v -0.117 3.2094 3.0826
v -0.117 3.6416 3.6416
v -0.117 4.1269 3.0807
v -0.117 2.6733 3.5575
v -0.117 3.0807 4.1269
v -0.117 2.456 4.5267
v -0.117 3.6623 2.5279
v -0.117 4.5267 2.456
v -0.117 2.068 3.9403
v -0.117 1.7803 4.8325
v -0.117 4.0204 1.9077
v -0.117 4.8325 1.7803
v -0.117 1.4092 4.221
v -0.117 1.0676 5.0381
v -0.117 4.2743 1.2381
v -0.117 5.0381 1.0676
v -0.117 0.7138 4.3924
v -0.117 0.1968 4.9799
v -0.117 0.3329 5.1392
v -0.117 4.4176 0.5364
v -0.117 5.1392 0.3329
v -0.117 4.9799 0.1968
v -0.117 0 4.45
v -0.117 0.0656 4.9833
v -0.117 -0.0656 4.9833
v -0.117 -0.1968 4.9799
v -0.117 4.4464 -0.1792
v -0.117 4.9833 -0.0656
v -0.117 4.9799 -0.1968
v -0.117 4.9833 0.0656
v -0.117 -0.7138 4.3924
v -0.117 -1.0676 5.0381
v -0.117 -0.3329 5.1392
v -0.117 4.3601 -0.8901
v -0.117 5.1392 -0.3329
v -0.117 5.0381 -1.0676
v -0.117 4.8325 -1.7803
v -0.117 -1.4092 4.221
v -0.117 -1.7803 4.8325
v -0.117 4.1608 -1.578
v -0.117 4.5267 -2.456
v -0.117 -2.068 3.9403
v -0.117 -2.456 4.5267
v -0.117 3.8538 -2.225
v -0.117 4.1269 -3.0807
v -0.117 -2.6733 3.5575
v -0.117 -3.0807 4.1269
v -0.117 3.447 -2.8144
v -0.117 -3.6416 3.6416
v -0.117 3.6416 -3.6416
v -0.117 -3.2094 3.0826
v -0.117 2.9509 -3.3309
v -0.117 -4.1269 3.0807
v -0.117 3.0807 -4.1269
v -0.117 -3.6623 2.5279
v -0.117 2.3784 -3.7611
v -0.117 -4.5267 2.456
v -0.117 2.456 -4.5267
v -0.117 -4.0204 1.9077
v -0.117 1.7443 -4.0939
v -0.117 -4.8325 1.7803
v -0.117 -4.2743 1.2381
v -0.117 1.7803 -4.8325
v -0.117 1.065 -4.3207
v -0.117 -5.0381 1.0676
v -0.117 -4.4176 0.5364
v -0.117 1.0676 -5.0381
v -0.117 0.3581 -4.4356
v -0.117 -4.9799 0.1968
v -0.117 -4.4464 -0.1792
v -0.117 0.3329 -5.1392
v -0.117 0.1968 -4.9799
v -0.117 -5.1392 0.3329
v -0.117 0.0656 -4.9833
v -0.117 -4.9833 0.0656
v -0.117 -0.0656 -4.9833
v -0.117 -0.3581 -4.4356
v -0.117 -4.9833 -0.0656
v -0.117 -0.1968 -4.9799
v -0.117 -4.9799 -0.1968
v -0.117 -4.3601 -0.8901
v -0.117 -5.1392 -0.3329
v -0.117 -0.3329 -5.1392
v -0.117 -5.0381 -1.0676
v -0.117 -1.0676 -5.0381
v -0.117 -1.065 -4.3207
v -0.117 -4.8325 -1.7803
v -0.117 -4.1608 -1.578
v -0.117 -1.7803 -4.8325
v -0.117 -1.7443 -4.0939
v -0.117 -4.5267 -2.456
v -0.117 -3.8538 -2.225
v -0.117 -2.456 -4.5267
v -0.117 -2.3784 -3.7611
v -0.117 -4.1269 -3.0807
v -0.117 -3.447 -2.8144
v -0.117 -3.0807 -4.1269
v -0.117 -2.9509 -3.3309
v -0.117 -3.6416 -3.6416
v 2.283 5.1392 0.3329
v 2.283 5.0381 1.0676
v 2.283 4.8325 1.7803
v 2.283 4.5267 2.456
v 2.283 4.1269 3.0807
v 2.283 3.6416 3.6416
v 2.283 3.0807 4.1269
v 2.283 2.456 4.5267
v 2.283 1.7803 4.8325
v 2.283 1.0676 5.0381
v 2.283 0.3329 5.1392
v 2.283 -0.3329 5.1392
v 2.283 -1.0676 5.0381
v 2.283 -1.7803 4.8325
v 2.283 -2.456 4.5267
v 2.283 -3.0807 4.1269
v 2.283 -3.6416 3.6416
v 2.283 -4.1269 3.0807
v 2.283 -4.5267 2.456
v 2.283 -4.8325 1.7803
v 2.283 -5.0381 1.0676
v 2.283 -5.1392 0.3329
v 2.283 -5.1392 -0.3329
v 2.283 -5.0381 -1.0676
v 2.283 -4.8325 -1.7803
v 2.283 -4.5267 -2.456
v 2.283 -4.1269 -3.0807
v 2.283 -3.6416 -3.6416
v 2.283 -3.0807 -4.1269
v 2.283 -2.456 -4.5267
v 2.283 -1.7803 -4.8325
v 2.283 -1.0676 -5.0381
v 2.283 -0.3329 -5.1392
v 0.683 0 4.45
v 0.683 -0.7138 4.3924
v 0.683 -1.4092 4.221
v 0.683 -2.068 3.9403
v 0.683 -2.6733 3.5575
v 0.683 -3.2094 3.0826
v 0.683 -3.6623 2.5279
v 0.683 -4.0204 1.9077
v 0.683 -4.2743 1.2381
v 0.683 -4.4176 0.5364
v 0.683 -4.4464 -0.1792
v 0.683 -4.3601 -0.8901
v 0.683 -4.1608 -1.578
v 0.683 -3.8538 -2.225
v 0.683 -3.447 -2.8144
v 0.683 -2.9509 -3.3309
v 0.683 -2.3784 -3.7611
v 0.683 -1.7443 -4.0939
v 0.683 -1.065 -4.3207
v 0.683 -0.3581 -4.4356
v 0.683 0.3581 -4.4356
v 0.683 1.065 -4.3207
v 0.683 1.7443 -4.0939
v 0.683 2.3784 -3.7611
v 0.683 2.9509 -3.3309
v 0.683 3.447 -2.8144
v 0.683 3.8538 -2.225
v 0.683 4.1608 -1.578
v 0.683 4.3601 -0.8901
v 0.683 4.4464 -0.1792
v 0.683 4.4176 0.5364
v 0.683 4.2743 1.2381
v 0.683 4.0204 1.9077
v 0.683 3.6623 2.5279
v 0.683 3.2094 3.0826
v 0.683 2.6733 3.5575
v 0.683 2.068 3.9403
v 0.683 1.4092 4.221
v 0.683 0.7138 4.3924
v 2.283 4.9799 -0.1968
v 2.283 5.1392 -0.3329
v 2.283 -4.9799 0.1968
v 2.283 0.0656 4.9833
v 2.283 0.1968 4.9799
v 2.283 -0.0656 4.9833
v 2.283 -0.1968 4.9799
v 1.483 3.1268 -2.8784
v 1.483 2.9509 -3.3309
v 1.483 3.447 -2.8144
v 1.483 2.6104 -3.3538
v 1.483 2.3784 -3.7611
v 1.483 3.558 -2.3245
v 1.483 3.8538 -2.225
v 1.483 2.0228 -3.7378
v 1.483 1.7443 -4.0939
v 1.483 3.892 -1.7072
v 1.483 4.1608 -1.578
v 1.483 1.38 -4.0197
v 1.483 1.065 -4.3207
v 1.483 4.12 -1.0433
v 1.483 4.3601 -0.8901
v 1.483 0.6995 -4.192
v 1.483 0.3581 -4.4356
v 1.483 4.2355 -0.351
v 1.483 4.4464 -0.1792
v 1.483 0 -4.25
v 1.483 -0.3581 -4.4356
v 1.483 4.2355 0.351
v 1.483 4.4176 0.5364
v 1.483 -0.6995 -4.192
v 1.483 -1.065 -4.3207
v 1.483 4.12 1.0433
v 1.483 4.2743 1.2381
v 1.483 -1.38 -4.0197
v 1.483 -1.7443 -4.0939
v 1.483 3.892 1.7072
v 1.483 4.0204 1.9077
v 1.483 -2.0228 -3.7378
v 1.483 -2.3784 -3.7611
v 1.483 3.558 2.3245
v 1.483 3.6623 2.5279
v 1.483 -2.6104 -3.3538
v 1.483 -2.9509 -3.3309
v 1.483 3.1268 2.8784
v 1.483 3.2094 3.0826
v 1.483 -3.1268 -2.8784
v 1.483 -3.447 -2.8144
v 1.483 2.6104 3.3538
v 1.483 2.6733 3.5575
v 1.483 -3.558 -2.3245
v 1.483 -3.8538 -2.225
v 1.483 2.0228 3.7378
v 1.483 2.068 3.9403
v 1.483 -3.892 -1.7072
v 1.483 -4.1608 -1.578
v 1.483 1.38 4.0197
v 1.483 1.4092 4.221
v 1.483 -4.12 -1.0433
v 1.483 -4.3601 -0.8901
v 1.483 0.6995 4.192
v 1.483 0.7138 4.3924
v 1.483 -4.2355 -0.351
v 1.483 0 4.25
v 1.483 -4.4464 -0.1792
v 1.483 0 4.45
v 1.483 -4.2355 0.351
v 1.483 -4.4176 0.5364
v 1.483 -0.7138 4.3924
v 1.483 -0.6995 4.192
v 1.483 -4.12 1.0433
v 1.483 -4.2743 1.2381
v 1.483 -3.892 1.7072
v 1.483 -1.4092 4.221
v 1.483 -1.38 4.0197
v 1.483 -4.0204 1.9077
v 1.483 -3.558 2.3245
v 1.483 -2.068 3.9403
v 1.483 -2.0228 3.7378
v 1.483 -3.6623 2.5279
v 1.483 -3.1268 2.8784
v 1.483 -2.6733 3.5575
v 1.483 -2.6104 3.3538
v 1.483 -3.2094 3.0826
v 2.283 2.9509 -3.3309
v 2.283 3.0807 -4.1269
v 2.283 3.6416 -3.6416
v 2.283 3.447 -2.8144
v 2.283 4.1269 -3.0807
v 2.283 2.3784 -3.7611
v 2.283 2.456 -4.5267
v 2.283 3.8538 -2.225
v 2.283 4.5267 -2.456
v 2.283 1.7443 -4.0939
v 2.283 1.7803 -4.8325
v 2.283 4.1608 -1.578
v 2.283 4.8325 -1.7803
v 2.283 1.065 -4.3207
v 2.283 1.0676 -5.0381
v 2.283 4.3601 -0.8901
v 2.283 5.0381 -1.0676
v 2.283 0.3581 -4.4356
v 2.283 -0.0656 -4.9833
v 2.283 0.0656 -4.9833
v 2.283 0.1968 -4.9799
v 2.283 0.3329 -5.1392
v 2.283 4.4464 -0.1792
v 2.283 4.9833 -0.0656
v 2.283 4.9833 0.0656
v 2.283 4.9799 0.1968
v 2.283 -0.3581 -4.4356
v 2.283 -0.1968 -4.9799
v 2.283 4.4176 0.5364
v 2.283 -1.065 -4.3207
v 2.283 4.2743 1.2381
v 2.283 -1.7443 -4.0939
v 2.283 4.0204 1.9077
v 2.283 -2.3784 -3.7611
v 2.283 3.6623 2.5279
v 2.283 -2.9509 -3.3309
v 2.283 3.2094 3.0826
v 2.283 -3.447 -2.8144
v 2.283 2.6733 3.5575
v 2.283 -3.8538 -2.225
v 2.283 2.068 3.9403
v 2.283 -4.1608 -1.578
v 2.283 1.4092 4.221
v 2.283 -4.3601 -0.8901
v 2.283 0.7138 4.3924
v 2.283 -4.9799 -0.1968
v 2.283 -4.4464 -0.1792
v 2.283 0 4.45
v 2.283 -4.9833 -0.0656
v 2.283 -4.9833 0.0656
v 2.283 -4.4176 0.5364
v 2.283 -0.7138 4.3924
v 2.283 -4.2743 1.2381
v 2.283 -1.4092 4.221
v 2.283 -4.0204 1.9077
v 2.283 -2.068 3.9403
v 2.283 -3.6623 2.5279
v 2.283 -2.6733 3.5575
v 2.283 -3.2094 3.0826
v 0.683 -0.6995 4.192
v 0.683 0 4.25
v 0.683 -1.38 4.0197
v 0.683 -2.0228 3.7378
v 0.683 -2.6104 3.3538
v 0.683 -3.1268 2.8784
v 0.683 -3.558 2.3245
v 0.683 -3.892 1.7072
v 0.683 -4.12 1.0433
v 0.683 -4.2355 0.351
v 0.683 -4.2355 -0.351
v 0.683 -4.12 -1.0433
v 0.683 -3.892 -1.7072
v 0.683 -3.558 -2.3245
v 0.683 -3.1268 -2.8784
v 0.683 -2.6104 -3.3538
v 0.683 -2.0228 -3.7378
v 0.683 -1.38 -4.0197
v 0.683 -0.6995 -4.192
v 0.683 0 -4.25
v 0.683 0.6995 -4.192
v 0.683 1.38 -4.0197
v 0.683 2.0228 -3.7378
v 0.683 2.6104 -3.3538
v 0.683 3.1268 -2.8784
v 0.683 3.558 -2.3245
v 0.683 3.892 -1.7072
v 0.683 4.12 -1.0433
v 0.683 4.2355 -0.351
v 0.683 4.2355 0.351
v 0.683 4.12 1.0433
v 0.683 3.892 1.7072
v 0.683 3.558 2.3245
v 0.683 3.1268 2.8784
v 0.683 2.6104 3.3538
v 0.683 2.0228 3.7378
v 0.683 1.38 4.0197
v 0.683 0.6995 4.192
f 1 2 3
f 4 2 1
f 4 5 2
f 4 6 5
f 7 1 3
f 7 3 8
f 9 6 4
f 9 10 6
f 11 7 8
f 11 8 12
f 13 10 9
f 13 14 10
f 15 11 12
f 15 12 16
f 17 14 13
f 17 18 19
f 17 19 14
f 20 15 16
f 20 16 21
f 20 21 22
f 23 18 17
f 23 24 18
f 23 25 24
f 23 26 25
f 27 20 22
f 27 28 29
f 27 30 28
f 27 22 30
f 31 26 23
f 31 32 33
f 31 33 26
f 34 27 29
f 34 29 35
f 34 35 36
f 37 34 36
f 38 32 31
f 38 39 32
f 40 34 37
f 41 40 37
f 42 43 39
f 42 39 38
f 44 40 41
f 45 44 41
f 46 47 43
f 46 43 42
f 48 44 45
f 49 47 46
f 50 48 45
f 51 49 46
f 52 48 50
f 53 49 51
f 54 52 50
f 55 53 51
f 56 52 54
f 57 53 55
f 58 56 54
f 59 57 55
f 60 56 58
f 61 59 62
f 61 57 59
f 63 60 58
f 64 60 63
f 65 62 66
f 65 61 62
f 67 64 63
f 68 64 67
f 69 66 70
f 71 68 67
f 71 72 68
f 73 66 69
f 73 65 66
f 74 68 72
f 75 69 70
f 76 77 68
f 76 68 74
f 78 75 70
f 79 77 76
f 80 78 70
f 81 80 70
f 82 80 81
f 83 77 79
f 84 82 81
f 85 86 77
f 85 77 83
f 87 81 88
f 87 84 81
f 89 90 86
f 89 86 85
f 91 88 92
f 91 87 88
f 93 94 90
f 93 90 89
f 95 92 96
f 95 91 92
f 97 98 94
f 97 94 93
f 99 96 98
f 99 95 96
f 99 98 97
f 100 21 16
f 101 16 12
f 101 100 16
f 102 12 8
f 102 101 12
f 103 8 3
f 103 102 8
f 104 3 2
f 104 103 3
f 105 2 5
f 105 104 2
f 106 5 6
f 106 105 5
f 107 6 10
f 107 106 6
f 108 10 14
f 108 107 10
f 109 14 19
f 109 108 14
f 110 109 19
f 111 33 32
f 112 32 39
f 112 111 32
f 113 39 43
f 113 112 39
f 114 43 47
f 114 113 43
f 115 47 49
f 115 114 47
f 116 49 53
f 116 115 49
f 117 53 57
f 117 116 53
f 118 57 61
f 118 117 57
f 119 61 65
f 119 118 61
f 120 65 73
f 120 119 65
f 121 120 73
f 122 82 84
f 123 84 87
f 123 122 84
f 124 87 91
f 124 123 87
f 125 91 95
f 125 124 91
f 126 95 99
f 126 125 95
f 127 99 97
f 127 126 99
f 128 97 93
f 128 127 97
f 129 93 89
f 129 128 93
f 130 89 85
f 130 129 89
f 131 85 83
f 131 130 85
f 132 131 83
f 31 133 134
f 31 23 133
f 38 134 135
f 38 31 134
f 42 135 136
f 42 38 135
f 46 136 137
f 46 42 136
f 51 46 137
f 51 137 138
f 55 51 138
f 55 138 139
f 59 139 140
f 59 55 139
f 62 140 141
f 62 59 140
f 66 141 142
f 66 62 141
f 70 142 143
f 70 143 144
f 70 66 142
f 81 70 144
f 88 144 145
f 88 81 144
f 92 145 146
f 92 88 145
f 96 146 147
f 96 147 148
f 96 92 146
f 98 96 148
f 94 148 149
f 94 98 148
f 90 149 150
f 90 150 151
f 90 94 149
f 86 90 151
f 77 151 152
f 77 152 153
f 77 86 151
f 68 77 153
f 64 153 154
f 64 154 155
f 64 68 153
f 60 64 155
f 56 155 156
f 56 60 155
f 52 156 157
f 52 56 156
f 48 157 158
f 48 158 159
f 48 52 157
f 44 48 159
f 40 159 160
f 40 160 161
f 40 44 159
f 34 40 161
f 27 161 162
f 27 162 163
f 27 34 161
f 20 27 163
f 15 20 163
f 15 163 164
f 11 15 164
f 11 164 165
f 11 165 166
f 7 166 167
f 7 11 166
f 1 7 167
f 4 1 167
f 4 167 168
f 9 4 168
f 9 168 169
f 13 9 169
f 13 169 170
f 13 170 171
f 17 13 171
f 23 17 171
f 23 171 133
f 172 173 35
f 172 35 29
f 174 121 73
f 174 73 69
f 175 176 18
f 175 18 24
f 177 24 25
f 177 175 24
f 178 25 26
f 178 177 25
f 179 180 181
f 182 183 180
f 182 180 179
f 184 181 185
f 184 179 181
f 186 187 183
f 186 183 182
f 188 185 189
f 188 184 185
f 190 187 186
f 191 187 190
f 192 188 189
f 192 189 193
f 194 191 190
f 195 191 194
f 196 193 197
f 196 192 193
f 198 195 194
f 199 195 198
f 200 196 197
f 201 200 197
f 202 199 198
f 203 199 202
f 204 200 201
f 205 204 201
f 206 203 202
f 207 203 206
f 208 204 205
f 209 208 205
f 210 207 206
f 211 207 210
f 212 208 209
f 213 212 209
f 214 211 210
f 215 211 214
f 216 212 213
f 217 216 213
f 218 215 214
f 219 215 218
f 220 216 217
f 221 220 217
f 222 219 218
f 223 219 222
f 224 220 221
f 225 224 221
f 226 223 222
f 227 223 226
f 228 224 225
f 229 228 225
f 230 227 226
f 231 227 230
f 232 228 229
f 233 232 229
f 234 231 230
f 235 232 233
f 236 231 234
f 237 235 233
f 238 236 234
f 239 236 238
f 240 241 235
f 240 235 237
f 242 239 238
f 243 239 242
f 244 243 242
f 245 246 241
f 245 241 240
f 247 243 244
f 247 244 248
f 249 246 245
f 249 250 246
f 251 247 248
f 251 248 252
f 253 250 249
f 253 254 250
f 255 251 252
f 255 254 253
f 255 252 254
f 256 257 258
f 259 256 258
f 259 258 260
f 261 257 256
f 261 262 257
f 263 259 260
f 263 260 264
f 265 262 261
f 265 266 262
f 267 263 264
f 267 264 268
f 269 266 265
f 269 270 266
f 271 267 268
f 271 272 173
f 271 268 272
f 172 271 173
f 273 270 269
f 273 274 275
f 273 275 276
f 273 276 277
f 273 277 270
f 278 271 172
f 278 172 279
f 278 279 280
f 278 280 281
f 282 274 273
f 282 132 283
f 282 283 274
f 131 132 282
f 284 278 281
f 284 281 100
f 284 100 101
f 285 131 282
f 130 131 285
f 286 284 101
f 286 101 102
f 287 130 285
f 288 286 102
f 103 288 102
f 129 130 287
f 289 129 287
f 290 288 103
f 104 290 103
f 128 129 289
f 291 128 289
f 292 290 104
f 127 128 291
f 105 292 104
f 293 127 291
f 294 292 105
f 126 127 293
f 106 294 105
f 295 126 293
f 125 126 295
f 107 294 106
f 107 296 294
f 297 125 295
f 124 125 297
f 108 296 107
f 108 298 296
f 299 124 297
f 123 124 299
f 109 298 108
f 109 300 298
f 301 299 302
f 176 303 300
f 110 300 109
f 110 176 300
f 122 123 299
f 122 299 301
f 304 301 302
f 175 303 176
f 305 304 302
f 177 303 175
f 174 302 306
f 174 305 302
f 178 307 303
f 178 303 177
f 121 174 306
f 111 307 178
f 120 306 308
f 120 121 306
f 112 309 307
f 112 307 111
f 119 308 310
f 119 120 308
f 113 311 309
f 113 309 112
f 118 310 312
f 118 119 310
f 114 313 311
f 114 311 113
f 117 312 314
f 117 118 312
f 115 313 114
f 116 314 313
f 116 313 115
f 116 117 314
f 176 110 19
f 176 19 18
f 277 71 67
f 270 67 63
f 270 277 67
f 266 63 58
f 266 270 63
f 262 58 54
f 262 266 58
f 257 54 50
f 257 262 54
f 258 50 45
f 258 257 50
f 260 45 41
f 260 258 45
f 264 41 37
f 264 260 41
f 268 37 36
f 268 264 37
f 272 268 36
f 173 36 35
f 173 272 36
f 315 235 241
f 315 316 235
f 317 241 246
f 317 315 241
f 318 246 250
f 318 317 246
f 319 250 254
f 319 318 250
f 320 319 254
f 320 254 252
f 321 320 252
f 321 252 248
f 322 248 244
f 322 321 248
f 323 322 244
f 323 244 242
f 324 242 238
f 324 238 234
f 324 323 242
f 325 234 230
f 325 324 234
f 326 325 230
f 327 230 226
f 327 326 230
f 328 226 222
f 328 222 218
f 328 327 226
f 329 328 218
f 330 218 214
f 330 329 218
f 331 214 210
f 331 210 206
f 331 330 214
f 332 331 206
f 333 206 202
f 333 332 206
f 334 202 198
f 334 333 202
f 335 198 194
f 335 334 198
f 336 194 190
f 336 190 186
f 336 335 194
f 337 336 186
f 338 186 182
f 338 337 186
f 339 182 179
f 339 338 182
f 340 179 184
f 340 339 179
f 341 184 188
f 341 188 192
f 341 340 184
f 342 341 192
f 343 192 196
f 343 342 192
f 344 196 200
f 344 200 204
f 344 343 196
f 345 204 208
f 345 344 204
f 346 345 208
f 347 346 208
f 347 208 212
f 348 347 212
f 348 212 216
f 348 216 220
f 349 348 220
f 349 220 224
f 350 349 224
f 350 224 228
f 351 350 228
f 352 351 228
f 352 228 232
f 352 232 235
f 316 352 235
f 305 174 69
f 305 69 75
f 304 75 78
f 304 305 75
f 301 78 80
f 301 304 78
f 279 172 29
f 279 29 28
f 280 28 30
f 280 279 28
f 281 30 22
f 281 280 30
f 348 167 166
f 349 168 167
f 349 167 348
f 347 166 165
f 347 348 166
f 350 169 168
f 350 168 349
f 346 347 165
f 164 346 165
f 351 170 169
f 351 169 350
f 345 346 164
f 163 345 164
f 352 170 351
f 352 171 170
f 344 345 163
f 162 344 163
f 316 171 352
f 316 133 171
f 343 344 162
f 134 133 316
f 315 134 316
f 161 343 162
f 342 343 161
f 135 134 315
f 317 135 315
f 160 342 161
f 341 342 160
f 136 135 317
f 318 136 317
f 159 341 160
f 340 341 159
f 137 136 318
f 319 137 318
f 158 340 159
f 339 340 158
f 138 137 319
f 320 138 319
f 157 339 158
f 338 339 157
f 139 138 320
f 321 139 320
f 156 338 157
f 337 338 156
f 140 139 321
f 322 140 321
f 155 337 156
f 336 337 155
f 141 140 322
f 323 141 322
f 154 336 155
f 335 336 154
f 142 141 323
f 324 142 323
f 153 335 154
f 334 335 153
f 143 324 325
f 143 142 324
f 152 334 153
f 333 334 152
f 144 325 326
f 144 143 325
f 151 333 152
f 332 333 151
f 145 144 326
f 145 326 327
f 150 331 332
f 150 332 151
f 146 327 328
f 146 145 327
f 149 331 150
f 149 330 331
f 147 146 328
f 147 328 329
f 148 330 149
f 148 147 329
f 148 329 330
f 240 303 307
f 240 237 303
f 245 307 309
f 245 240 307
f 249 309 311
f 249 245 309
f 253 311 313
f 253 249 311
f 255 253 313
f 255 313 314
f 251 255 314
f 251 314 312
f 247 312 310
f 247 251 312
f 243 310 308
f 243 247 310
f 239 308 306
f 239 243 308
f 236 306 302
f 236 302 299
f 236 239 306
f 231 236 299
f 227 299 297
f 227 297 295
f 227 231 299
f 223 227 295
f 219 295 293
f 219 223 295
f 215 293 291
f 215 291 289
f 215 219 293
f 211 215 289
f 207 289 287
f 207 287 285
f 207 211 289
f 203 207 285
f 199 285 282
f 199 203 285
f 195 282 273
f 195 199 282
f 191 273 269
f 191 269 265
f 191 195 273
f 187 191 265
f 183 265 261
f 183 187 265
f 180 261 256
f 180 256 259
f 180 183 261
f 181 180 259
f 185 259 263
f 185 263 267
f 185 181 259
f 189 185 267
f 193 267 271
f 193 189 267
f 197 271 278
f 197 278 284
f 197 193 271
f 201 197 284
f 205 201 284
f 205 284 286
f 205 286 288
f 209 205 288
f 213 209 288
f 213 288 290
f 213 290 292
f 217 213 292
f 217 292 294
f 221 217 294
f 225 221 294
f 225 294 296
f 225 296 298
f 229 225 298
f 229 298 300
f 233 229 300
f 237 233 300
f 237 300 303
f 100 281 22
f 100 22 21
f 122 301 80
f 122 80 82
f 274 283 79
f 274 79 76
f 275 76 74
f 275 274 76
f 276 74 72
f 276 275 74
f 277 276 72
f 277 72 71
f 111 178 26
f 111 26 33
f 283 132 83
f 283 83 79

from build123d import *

# Parameters (mm, degrees)
EXTRUS_O4_DEPTH       = 8.668441823
PADR_OCIRCULAR2_COUNT = 4


with BuildPart() as part:
    # Esboço4 → Revolução1 (revolve)
    with BuildSketch(Plane.YX, mode=Mode.PRIVATE) as revolu_o1_sk:
        Polygon((-5.15, -0.116989073), (-5.15, 2.283010927), (-4.45, 2.283010927), (-4.45, 1.483010927), (-4.25, 1.483010927), (-4.25, 0.683010927), (-4.45, 0.683010927), (-4.45, -0.116989073), align=None)
    revolve(revolu_o1_sk.sketch.rotate(Axis((-0.622453524, 0, 0), (1, 0, 0)), 270), axis=Axis((-0.622453524, 0, 0), (1, 0, 0)))

    # Esboço5 → Extrusão4 (cut, through all)
    with BuildSketch(Plane(origin=(2.283010927, 0, 0), x_dir=(0, 0, 1), z_dir=(1, 0, 0))):
        with BuildLine():
            Line((-0.196837681, 4.979857893), (-0.332878645, 5.139230663))
            ThreePointArc((-0.332878645, 5.139230663), (0, 5.15), (0.332878645, 5.139230663))
            Line((0.332878645, 5.139230663), (0.196837681, 4.979857893))
            ThreePointArc((0.196837681, 4.979857893), (0, 4.983746554), (-0.196837681, 4.979857893))
        make_face()
    extrus_o4 = extrude(amount=-EXTRUS_O4_DEPTH, mode=Mode.SUBTRACT)

    # PadrãoCircular2: Extrusão4 ×4 about axis
    padr_ocircular2_axis = Axis((0, 0, 0), (1, 0, 0))
    for i in range(1, PADR_OCIRCULAR2_COUNT):
        add(extrus_o4.rotate(padr_ocircular2_axis, i * 360 / PADR_OCIRCULAR2_COUNT), mode=Mode.SUBTRACT)


solid = part.part
